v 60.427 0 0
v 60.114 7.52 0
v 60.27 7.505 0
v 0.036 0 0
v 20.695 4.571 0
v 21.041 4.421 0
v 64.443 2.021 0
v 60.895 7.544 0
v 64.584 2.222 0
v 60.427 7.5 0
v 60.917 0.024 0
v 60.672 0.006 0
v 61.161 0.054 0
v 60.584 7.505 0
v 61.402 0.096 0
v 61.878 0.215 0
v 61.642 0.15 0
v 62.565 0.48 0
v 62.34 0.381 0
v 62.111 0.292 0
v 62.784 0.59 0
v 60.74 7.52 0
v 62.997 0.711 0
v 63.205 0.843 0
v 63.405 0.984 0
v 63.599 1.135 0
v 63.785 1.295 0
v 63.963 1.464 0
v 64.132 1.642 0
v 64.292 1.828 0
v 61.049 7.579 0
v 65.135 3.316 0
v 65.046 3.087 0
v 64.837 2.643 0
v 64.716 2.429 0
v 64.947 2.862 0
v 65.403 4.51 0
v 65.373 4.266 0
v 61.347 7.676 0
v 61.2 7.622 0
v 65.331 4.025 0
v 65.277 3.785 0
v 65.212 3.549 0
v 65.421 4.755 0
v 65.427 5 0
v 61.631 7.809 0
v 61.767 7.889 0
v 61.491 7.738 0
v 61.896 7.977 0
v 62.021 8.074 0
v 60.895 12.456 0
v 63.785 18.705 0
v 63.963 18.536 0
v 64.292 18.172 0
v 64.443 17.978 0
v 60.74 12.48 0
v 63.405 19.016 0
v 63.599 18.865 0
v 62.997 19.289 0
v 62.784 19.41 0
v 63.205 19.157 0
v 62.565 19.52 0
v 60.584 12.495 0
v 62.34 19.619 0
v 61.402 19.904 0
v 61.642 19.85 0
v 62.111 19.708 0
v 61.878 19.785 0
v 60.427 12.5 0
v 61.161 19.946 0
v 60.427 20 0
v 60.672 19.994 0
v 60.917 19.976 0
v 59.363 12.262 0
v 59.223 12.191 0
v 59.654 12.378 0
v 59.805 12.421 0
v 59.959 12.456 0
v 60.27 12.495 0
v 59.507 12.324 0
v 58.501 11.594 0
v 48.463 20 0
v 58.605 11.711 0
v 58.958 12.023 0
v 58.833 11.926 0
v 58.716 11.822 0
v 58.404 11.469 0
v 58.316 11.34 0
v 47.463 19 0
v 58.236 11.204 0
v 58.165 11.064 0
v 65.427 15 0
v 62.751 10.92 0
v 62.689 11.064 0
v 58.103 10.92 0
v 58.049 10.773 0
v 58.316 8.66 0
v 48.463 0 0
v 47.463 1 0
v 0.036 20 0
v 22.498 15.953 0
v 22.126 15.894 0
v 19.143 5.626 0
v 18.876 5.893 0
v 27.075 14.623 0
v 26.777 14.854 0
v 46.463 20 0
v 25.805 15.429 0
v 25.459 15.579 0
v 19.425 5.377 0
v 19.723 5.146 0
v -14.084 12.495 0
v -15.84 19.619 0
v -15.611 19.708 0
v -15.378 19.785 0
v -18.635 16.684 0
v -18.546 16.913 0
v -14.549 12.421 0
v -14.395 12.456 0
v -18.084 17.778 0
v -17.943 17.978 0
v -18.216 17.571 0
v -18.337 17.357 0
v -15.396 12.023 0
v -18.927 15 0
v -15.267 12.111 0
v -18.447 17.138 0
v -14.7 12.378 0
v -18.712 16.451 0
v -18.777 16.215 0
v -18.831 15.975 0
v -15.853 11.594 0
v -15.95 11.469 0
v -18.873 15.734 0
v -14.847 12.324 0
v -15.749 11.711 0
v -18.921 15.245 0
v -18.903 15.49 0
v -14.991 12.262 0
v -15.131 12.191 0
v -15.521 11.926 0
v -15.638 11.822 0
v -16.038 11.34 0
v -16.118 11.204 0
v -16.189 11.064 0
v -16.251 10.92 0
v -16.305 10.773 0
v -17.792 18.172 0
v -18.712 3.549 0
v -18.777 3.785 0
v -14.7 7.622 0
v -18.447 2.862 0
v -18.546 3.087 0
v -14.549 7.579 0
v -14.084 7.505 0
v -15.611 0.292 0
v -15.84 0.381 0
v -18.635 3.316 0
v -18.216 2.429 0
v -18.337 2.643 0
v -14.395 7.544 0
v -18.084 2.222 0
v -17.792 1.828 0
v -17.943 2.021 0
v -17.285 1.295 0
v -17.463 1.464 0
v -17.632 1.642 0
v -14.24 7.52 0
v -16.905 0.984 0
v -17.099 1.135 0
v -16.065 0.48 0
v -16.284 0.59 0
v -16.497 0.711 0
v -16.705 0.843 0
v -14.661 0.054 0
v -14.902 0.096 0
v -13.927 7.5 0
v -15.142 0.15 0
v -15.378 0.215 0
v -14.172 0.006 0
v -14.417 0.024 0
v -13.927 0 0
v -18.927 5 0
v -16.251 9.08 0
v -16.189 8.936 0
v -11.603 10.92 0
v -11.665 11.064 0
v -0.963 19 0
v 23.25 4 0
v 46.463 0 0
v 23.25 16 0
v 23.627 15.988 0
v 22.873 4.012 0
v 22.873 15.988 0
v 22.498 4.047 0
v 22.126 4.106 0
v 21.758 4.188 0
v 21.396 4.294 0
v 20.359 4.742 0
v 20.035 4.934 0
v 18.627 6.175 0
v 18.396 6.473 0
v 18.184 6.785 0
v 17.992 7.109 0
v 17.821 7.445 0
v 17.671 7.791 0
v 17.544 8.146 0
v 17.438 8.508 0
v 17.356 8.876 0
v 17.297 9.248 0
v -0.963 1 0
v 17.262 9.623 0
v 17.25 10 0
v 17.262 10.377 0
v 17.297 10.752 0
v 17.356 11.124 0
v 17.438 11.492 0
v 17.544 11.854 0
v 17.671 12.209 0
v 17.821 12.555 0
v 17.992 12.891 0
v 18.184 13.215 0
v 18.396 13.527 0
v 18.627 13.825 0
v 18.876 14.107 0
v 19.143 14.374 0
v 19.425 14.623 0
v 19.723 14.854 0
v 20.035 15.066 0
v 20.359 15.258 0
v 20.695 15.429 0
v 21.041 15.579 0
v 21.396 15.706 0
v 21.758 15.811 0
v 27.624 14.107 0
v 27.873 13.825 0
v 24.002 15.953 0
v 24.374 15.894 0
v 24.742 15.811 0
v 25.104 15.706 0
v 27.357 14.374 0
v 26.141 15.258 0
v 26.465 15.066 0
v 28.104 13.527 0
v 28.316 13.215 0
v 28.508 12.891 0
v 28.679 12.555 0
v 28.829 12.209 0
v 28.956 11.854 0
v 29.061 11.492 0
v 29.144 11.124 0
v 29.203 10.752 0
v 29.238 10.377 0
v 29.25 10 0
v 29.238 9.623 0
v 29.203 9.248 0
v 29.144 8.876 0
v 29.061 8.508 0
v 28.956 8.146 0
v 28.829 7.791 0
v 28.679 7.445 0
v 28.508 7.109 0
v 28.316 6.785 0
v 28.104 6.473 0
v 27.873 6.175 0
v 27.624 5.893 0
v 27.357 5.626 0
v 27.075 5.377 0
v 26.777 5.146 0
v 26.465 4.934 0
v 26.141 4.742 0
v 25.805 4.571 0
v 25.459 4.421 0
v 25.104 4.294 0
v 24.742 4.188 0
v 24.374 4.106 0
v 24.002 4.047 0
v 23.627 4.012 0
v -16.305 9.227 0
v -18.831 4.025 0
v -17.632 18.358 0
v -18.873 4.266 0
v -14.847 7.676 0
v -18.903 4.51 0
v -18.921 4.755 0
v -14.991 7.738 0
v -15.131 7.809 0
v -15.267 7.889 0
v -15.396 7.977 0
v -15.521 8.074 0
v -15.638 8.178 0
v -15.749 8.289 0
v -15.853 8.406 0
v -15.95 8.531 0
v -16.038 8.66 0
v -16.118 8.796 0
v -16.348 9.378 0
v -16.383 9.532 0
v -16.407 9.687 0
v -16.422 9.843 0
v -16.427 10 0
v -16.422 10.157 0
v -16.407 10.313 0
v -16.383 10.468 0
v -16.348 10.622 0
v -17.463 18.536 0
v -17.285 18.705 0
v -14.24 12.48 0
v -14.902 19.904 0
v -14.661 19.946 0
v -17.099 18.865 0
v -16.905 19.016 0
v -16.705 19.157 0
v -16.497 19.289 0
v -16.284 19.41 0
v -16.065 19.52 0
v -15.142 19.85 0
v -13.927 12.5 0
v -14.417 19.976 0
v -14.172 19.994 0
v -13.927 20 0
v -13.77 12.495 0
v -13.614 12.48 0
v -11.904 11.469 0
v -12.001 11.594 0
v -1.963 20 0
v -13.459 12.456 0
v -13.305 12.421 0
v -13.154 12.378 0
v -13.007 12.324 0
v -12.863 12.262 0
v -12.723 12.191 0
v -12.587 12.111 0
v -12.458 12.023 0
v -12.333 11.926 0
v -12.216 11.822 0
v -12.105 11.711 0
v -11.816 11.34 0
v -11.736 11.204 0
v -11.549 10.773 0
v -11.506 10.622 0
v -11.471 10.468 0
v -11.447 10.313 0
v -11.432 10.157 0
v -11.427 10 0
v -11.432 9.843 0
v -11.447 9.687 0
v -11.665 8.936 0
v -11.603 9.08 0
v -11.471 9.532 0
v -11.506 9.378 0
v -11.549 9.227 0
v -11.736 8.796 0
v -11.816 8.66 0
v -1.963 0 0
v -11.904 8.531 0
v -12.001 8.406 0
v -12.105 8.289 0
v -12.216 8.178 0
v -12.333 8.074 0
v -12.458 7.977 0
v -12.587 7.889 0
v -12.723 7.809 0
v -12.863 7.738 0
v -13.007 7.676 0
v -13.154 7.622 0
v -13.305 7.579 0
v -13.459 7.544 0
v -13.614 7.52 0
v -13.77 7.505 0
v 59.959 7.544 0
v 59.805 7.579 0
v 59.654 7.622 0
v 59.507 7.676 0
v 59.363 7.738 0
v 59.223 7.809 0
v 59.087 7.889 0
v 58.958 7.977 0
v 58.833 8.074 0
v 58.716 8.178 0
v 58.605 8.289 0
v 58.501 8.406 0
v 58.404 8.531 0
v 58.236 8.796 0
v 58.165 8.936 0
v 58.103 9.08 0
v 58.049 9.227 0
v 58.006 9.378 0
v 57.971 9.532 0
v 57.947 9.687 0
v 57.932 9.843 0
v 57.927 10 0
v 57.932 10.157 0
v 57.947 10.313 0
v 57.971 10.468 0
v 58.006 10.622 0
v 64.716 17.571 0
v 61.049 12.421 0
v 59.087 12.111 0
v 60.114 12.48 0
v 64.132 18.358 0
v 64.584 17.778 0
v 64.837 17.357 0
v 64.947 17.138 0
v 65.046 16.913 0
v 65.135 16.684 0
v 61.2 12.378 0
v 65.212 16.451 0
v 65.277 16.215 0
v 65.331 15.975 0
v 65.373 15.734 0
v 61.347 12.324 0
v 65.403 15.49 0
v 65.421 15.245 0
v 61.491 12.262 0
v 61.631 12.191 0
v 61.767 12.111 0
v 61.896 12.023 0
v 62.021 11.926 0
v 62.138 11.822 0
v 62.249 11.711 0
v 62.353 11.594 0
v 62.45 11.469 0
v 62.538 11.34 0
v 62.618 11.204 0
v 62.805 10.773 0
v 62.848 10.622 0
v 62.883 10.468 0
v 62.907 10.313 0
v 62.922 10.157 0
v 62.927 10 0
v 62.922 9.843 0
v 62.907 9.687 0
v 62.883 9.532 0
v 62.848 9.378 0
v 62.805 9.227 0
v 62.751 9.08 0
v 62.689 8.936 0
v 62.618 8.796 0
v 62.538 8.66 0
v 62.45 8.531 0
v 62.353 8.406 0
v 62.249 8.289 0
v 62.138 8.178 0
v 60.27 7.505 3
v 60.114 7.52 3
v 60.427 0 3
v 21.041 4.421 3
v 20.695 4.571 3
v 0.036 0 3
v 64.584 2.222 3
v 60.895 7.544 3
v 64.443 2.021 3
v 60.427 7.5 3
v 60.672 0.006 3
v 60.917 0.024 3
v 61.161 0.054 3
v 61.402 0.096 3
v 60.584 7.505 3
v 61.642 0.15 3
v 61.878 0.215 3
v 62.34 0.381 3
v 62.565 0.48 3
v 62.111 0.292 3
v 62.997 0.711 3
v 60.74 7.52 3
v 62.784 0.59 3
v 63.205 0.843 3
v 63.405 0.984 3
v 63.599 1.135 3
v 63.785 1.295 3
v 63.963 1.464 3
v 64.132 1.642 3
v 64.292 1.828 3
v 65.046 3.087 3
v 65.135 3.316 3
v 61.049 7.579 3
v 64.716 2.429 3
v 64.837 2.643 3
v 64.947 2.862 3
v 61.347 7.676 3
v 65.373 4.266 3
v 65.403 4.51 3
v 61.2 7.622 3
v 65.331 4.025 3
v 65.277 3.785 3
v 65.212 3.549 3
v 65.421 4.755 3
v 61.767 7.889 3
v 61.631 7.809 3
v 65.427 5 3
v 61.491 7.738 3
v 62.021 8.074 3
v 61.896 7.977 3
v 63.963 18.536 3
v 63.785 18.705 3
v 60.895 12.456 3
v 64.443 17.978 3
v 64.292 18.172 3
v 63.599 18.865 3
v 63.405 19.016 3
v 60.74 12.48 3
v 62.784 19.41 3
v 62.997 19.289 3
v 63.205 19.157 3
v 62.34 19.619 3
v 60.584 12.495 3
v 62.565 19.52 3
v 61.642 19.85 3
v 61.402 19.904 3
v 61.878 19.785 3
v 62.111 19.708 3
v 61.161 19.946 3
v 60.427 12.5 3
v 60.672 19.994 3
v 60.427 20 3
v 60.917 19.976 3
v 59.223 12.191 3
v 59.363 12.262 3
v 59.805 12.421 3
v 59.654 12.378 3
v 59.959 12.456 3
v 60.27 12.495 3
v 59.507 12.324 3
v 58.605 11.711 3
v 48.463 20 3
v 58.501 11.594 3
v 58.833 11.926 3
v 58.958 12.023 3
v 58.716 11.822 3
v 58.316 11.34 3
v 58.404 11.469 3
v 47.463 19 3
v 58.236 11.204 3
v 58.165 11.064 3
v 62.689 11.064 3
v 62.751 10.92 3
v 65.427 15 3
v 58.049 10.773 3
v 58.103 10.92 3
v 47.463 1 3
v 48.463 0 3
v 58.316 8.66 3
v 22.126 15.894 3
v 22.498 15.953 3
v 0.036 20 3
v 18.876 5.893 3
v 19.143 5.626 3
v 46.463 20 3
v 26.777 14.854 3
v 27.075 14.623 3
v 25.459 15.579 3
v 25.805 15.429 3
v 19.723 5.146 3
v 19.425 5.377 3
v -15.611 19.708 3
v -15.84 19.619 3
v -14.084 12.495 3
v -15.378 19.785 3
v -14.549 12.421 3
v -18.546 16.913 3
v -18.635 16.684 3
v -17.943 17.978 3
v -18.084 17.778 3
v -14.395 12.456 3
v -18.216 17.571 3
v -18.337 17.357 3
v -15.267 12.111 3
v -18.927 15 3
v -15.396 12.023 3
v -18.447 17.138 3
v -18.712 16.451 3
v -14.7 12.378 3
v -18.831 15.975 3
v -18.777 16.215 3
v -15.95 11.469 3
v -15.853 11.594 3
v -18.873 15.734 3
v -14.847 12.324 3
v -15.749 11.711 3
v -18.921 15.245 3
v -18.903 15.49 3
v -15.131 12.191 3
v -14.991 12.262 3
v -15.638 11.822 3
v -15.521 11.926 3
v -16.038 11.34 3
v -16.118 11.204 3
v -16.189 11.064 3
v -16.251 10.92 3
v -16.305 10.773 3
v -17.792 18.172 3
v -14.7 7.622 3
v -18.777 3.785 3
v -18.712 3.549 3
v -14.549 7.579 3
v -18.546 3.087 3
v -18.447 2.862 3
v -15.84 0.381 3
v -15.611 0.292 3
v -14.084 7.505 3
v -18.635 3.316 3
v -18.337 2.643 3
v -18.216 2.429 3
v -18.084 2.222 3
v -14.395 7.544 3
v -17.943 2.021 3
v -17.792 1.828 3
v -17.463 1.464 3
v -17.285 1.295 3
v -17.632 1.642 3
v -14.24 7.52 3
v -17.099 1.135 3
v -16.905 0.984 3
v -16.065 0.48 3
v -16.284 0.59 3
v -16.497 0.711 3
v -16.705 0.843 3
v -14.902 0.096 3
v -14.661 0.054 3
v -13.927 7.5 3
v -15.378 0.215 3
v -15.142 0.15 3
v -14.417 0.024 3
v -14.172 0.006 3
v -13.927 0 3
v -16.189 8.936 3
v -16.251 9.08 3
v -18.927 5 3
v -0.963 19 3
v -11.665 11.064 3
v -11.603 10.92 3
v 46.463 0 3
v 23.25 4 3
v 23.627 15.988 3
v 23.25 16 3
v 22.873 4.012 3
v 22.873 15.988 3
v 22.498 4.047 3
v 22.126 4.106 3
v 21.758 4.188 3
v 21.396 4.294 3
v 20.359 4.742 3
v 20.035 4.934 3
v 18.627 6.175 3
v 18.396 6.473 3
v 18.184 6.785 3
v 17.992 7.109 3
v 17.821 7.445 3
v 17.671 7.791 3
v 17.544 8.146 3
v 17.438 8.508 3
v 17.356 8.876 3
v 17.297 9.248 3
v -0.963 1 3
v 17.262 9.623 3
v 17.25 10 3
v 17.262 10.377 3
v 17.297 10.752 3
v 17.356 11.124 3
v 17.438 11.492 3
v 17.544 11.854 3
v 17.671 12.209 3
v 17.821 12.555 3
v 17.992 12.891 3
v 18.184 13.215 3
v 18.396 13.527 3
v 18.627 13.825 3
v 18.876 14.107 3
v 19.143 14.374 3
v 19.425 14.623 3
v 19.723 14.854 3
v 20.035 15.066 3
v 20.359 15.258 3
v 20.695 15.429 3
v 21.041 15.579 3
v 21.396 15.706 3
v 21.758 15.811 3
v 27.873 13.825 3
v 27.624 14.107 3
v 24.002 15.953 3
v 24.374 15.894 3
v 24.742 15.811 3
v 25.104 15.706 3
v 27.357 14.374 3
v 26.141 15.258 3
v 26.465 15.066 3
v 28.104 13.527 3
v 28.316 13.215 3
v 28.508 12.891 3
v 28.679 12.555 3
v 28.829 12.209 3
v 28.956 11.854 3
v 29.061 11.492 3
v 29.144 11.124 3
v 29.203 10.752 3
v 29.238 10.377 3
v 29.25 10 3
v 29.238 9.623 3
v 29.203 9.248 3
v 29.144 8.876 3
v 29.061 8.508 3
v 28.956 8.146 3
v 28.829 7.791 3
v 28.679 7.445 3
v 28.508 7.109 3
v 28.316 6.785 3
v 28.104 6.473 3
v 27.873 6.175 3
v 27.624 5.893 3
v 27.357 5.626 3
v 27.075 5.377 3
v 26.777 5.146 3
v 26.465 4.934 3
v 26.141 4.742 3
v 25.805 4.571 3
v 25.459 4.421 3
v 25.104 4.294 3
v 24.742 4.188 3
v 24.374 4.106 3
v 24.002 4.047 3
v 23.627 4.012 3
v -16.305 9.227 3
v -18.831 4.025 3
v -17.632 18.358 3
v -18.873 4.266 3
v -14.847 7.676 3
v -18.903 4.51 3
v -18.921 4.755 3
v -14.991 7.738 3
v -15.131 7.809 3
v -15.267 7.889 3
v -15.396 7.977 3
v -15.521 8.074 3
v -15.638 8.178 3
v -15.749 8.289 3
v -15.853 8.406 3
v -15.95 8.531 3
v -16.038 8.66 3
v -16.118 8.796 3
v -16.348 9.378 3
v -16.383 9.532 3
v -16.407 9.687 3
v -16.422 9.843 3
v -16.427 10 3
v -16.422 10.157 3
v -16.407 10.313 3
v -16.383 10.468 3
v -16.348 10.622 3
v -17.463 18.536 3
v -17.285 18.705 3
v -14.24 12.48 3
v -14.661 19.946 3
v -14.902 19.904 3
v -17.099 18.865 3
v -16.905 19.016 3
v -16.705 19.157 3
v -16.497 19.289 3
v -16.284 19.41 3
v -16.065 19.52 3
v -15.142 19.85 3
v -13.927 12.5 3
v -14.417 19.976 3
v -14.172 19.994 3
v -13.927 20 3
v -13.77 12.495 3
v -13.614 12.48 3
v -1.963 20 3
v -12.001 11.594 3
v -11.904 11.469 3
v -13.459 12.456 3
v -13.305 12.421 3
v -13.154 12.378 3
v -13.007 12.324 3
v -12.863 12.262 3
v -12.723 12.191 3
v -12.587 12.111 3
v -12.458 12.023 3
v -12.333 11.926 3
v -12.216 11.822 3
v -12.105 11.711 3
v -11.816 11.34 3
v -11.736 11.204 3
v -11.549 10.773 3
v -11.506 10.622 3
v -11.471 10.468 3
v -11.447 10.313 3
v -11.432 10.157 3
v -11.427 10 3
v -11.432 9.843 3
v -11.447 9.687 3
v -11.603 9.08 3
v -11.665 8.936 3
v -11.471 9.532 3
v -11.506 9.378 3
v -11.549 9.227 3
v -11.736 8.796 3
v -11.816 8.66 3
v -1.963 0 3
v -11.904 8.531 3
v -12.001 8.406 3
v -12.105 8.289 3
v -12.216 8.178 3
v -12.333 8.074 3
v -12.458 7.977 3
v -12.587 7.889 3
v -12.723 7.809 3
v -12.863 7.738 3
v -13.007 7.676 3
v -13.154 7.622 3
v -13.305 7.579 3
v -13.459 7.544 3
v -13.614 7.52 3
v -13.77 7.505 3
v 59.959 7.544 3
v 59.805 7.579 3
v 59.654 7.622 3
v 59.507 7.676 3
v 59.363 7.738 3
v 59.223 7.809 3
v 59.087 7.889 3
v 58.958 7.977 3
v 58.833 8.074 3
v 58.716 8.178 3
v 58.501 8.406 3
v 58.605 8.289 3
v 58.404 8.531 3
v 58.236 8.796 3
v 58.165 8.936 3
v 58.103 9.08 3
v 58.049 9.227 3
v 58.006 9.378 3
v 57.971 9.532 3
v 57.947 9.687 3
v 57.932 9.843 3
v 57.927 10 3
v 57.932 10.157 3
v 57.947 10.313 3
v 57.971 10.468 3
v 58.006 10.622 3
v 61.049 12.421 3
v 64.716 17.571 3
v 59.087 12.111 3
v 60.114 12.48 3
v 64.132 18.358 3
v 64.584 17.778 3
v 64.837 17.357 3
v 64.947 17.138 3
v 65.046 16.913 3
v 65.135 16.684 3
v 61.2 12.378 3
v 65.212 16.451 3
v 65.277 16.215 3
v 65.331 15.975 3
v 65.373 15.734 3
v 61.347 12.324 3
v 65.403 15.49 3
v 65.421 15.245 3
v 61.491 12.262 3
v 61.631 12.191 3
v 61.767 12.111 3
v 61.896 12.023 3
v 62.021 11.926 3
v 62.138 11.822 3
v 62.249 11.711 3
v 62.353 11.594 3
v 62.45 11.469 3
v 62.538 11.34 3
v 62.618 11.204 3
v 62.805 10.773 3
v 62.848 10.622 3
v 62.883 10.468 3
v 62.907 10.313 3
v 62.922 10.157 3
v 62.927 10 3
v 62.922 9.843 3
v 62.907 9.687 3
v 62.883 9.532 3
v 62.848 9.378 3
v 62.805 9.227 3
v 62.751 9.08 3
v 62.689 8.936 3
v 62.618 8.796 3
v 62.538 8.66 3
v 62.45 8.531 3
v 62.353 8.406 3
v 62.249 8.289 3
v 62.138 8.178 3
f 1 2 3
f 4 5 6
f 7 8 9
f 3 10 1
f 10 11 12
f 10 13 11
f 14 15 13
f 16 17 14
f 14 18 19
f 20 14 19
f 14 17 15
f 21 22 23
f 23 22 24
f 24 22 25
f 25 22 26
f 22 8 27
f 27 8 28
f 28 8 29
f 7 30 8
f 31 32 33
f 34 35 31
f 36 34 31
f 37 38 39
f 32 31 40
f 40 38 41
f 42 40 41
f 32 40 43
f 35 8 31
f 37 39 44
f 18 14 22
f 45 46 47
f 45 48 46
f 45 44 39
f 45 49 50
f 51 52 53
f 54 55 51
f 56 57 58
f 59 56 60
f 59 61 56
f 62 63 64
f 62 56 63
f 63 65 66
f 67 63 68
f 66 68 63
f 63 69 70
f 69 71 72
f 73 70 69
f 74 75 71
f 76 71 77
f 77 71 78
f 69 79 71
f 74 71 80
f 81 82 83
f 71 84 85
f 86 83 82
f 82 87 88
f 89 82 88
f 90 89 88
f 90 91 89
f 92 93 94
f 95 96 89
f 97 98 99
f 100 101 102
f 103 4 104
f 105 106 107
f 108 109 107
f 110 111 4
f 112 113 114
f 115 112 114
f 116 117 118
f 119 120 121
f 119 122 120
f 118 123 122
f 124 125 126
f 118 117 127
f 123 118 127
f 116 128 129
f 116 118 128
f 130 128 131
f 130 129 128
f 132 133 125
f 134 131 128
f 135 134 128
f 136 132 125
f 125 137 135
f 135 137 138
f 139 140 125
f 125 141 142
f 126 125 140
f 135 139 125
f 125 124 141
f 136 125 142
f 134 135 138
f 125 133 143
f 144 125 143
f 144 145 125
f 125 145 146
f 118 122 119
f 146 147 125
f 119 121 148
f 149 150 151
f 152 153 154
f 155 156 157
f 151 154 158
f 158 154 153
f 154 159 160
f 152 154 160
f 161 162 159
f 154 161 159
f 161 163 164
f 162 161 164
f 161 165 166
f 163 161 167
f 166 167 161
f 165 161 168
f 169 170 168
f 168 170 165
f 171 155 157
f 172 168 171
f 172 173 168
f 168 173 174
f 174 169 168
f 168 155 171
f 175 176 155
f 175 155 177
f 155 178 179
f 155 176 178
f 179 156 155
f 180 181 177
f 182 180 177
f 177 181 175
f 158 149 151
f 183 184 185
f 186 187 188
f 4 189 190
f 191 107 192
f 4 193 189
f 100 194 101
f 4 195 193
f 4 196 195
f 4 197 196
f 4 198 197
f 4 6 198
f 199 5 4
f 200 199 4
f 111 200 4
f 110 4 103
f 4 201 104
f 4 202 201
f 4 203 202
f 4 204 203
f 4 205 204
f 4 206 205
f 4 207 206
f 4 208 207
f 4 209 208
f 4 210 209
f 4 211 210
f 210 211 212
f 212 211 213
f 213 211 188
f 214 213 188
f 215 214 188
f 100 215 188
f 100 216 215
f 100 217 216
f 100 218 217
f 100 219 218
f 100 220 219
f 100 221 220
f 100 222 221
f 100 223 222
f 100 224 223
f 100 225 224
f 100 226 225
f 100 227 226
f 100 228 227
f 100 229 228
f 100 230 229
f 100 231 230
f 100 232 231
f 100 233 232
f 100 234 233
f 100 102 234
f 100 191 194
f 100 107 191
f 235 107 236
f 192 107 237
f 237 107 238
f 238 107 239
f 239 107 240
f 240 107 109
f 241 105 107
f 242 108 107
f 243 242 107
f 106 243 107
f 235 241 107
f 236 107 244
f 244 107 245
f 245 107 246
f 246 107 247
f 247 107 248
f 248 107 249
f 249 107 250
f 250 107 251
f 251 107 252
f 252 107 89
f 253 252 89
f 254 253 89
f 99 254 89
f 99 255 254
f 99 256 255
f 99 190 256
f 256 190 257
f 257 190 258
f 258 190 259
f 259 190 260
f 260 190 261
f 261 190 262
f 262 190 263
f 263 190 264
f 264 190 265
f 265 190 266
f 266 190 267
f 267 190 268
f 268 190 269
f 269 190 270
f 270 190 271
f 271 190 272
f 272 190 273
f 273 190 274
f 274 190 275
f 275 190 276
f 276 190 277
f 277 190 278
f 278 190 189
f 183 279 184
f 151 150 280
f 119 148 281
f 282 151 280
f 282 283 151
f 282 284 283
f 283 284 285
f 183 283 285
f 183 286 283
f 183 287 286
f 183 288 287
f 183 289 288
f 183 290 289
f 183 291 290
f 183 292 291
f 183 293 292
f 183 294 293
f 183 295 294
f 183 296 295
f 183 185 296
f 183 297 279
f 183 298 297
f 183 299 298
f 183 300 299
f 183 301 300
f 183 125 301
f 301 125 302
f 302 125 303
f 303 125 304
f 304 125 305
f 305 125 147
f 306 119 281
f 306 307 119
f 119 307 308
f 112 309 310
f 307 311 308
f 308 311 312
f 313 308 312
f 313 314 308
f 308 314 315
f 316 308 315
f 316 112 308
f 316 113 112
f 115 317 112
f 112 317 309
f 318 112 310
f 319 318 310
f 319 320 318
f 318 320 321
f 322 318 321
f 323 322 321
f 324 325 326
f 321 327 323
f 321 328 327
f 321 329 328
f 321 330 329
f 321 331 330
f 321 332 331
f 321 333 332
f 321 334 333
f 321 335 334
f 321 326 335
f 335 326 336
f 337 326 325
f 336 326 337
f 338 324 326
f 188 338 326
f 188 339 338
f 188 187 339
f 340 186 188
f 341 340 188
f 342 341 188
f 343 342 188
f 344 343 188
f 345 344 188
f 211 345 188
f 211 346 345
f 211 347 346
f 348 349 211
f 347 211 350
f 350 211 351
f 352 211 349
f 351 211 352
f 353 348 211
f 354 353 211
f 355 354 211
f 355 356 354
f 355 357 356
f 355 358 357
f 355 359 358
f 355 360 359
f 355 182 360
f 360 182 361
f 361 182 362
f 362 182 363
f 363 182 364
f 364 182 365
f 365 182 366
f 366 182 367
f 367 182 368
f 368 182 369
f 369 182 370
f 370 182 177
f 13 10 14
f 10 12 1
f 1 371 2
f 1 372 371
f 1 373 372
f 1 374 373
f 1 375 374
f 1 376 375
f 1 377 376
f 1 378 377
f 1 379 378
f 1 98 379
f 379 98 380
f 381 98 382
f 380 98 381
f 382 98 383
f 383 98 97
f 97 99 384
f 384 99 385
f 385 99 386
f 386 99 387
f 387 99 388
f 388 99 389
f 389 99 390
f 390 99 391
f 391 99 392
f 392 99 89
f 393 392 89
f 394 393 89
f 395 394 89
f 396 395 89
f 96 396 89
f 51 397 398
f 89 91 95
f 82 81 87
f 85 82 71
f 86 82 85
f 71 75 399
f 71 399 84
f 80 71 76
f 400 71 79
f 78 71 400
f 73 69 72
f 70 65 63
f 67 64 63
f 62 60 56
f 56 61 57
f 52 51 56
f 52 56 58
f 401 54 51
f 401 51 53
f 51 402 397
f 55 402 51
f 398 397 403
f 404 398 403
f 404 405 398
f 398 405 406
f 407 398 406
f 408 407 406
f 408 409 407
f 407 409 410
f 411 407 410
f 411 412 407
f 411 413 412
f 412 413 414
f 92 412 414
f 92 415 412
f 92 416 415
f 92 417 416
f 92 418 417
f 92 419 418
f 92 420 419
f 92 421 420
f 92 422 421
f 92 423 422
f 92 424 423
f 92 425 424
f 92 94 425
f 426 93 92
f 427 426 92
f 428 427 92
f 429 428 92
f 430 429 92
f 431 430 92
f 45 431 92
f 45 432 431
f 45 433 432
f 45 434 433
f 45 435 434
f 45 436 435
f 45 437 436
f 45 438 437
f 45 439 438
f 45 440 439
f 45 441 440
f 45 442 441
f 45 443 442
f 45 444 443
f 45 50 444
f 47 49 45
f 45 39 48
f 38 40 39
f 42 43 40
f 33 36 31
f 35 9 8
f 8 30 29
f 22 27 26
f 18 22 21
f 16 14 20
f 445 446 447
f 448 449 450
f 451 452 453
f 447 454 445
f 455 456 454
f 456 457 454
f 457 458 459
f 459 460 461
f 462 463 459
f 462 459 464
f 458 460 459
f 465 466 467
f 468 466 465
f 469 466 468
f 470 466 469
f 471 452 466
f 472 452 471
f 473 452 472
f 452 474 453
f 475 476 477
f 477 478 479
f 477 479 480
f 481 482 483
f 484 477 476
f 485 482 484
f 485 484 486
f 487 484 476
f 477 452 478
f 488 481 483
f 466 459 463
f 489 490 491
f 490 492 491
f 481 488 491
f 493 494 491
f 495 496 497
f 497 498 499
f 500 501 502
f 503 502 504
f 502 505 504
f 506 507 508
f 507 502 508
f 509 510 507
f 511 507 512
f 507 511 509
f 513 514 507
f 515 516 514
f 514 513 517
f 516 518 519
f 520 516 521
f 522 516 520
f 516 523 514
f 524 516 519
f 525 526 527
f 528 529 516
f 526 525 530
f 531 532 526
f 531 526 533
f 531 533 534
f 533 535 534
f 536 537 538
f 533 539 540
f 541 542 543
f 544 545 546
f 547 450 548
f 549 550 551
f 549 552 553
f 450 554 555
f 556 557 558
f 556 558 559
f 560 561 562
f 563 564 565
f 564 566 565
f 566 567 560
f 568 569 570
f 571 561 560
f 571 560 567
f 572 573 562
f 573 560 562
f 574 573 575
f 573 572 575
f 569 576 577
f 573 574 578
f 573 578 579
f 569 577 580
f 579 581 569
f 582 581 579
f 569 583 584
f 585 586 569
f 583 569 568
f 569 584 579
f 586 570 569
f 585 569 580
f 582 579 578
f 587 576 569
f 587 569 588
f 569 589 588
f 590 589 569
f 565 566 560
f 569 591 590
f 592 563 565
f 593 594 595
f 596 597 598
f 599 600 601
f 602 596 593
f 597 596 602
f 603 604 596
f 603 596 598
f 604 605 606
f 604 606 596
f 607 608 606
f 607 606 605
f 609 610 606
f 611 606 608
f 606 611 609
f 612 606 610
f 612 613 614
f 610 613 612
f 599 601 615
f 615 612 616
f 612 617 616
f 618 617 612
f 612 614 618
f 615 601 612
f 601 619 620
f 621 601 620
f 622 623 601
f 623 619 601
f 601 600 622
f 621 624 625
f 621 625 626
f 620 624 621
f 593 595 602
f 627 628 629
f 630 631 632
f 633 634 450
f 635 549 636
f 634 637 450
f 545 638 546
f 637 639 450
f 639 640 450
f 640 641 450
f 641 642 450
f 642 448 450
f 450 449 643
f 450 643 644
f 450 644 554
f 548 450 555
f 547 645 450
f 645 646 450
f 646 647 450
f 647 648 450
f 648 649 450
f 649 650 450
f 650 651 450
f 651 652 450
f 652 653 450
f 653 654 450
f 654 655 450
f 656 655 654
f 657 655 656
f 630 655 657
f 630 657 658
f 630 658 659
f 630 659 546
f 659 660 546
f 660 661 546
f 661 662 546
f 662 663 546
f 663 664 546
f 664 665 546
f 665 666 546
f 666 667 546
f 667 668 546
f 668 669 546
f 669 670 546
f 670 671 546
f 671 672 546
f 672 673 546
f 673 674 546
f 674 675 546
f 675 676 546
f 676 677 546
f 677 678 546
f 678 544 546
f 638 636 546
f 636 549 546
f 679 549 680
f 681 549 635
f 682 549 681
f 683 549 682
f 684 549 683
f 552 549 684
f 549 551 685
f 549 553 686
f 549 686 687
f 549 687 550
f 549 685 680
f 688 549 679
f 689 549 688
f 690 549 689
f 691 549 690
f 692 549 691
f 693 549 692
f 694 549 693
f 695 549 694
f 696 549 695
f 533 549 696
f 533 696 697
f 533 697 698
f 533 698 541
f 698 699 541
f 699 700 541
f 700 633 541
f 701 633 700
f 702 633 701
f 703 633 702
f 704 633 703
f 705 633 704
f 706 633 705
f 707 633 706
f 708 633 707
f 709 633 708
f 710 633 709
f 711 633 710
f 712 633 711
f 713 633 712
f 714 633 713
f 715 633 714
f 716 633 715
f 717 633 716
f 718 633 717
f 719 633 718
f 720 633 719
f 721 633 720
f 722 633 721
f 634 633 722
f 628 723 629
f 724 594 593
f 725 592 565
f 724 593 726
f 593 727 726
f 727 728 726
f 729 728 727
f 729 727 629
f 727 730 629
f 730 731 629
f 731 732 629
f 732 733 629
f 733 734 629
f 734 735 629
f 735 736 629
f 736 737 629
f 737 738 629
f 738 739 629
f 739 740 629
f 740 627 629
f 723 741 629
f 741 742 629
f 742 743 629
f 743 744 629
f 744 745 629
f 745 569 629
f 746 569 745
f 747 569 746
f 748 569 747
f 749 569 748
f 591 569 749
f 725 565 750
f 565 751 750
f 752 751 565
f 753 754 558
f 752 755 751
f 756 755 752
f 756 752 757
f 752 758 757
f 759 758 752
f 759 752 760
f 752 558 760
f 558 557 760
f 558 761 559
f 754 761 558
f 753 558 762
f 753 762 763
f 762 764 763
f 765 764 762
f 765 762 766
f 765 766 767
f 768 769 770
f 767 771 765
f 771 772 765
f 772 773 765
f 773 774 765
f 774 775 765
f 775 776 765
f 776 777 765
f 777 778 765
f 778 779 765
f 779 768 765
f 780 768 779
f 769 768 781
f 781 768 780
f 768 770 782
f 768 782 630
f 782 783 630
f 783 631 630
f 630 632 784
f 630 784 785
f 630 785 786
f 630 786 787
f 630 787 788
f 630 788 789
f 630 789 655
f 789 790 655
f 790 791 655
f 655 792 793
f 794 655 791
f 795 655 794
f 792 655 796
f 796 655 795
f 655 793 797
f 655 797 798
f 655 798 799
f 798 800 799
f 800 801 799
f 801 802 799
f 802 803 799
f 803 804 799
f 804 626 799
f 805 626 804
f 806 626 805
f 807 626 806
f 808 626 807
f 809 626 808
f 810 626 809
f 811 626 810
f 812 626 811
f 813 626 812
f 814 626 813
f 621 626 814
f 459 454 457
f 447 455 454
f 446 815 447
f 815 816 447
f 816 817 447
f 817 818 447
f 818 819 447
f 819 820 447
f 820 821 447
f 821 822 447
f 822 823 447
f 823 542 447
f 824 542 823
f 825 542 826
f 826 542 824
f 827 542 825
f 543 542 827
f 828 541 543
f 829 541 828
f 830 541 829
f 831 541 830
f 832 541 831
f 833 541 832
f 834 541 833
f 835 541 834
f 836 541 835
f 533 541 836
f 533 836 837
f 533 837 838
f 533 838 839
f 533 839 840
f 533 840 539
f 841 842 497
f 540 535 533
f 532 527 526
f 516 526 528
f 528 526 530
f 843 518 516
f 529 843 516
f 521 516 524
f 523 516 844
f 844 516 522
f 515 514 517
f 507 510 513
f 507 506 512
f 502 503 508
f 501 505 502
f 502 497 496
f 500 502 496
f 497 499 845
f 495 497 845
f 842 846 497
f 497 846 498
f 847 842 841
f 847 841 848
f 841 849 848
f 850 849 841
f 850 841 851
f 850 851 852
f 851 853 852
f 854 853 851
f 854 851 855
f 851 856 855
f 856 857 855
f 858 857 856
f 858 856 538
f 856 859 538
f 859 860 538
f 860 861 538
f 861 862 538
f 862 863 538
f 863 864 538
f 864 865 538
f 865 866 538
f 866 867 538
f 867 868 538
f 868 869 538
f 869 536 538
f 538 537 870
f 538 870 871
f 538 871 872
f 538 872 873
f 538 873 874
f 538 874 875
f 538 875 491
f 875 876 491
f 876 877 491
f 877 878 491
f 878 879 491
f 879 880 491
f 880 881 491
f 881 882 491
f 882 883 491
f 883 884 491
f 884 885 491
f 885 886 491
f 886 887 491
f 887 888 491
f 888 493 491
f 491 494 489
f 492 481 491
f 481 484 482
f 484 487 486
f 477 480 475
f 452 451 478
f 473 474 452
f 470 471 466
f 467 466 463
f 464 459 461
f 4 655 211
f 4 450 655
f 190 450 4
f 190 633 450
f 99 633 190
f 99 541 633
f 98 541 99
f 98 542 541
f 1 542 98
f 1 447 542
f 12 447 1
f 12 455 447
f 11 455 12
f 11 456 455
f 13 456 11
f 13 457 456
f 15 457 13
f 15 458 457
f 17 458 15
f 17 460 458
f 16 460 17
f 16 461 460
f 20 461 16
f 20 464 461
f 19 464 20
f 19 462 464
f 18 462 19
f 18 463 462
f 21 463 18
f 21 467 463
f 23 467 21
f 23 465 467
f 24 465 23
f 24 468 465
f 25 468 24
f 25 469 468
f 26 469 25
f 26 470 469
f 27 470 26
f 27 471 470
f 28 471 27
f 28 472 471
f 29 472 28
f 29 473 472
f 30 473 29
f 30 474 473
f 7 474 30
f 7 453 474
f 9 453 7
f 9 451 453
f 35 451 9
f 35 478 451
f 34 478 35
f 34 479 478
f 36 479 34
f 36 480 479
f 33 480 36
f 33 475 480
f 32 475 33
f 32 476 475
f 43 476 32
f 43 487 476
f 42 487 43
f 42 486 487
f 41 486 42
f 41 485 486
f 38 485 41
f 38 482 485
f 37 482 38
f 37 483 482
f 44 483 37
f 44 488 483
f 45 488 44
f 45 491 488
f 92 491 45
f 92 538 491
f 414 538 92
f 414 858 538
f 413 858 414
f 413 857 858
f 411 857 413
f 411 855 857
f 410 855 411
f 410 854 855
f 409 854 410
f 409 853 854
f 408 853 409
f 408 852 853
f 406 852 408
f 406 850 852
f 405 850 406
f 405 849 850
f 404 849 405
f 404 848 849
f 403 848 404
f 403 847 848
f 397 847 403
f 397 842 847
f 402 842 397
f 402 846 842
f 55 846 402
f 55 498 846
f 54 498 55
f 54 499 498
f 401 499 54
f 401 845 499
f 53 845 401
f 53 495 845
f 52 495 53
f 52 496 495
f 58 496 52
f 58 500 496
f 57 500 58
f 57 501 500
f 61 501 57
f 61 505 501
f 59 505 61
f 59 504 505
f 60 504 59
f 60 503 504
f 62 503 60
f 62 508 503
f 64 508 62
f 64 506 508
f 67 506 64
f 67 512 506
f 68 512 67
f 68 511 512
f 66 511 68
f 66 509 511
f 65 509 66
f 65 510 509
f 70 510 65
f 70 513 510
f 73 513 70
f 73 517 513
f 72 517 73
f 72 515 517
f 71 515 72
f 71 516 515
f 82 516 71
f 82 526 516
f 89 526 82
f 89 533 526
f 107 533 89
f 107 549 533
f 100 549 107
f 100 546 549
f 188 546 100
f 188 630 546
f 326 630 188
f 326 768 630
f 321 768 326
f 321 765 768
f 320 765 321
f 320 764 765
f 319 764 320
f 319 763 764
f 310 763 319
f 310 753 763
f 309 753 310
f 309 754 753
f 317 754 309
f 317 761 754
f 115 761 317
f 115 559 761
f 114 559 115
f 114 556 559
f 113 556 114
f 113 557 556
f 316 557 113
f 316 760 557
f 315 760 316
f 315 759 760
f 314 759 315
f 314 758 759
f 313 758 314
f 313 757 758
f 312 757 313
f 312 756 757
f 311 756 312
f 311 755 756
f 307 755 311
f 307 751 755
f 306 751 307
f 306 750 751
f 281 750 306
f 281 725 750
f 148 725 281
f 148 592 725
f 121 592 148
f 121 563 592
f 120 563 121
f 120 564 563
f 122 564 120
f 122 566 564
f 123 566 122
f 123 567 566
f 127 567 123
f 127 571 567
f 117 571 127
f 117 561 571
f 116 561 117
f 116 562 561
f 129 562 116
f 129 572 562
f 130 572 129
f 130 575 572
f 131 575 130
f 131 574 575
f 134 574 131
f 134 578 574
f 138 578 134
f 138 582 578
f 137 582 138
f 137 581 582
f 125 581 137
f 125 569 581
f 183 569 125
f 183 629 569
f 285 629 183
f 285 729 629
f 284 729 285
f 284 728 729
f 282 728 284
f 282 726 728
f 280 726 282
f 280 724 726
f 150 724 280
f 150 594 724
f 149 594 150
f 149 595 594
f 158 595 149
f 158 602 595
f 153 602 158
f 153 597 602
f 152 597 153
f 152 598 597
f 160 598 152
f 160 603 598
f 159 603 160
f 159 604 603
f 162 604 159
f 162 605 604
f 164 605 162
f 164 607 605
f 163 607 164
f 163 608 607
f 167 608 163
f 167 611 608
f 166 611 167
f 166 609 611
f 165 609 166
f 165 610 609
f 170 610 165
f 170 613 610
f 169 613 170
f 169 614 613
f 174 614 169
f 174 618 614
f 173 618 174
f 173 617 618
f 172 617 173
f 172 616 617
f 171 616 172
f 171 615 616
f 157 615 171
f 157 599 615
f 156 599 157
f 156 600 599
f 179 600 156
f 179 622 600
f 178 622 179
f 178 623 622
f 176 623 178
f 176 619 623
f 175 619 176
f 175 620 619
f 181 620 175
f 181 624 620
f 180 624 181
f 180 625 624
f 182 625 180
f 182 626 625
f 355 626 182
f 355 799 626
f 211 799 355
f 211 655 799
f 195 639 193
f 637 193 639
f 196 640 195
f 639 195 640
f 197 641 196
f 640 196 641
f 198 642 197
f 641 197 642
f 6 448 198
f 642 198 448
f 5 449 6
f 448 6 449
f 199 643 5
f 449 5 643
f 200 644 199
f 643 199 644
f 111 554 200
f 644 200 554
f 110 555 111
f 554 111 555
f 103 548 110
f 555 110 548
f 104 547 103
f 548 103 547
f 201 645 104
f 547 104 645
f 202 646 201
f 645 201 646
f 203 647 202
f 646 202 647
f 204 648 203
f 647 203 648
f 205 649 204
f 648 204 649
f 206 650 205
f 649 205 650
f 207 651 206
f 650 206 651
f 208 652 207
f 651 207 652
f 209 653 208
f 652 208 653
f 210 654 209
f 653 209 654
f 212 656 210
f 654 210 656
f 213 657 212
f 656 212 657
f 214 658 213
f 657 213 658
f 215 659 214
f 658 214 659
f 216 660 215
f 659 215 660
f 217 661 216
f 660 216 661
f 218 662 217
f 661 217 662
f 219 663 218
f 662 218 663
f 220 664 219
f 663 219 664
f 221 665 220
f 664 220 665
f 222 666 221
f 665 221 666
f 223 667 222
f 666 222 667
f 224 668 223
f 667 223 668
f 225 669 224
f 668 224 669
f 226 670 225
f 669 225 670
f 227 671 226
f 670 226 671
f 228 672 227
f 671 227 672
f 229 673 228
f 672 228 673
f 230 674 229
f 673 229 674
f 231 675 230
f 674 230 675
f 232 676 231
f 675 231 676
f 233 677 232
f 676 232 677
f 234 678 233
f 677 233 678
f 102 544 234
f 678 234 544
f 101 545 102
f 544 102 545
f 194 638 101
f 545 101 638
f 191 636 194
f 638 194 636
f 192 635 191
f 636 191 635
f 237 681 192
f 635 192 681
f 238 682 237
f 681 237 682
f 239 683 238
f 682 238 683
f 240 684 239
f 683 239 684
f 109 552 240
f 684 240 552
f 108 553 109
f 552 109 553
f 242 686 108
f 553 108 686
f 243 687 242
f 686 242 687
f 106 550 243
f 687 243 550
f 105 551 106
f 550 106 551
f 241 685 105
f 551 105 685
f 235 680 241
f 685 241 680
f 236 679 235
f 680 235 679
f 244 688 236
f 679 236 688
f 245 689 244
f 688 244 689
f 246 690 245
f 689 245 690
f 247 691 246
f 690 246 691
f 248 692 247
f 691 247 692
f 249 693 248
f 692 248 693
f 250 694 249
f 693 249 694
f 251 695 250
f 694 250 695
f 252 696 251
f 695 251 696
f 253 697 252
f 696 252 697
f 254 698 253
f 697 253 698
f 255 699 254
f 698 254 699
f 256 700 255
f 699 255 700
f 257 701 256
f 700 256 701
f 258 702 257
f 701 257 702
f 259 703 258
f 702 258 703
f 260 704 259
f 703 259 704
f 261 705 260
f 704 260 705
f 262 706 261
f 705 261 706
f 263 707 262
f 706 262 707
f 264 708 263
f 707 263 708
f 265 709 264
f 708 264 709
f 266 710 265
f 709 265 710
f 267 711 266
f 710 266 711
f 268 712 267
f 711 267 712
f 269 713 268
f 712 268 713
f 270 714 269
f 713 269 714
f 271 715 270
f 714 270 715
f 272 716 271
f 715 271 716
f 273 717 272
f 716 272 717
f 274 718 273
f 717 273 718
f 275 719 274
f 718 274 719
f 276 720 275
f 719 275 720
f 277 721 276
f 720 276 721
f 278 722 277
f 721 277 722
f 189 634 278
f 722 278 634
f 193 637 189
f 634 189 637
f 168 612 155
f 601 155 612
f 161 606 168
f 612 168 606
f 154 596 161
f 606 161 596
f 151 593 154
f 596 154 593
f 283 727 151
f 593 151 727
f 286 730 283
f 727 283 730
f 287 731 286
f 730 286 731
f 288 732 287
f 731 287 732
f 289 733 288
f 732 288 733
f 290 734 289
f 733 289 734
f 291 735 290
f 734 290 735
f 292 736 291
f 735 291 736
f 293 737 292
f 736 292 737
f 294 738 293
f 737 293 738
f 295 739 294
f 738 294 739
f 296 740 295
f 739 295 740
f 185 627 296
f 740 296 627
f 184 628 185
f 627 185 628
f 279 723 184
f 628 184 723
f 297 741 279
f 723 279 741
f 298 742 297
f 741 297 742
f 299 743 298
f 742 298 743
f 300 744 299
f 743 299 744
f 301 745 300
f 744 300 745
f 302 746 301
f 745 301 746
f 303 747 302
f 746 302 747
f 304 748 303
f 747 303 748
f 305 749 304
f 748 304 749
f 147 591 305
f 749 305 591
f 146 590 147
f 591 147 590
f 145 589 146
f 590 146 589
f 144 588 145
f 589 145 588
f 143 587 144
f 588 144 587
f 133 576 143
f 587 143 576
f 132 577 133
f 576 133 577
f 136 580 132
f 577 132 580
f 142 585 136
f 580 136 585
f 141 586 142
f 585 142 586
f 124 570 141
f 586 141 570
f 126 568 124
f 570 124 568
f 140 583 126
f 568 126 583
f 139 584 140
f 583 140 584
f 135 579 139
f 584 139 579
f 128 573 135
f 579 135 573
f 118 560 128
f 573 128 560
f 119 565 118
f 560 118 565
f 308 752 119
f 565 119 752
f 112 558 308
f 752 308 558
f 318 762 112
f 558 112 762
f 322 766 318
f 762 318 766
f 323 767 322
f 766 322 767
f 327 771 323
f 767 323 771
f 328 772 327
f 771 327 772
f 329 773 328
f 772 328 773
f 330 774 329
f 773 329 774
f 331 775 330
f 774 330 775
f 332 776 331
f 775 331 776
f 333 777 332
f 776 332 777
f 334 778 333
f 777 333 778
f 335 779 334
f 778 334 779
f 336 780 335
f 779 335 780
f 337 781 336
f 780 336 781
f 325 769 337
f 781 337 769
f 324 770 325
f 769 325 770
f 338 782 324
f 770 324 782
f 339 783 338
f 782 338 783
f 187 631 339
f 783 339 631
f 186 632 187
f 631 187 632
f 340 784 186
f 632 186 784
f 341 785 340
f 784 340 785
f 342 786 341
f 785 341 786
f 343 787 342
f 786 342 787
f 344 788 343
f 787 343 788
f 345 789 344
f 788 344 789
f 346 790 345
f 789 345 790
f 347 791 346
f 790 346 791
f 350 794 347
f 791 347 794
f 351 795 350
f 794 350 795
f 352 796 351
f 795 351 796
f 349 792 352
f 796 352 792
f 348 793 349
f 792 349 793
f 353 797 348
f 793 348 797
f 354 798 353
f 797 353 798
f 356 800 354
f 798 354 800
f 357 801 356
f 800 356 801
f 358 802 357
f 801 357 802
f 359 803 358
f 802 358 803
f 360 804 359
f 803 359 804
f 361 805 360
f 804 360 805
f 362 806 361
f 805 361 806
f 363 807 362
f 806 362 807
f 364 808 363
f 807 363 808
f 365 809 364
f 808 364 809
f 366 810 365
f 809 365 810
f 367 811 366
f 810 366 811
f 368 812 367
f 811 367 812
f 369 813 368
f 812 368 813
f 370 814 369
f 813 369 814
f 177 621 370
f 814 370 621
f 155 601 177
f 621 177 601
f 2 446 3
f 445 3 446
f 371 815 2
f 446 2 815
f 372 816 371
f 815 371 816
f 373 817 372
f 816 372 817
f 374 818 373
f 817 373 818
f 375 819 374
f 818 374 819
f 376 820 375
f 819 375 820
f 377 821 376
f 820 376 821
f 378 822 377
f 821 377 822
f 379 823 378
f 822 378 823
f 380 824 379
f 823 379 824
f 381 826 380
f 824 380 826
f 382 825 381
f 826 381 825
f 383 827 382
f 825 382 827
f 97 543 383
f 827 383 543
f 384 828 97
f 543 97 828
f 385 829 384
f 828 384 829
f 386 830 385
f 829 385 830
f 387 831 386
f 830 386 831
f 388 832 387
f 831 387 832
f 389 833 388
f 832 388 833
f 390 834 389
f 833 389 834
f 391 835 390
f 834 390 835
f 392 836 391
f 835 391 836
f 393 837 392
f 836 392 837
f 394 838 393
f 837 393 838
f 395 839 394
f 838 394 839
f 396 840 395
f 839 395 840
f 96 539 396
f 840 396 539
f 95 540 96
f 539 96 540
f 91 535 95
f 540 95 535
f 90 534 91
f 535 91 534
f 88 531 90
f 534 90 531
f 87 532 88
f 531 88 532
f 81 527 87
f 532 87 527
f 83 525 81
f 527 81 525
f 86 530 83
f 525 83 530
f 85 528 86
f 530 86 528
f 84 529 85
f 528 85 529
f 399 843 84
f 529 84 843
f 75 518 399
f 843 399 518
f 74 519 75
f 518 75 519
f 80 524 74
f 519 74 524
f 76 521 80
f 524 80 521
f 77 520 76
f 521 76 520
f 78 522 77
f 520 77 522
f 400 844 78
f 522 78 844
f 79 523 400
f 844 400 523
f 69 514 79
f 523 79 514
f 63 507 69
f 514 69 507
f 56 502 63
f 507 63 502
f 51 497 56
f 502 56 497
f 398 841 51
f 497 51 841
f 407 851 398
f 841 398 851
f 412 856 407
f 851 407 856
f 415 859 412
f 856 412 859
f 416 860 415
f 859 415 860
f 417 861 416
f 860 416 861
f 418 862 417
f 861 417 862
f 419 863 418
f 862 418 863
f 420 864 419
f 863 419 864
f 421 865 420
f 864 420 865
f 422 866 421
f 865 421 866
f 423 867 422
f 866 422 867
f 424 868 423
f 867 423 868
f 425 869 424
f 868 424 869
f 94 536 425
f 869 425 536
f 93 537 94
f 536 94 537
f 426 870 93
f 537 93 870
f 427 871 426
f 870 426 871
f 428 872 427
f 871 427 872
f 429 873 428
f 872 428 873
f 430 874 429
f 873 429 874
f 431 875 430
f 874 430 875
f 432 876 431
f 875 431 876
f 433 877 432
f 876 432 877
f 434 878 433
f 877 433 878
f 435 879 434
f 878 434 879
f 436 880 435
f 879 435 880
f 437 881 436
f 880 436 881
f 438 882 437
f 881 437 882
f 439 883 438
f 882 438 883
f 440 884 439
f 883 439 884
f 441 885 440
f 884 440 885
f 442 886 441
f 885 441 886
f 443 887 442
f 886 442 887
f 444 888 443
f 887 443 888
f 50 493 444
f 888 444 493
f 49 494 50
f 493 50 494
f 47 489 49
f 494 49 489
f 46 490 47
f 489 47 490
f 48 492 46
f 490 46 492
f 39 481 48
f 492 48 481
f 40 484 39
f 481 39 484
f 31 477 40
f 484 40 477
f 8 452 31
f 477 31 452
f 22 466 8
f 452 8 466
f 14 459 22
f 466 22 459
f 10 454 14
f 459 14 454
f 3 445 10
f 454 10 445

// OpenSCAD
// 3mm Brake Spring Back Plate
// Extracted and reconstructed from DXF

$fn = 100;

// Main module to generate the part
module brake_spring_back_plate(thickness = 3.0) {
    linear_extrude(height = thickness) {
        difference() {
            outer_profile();
            internal_holes();
        }
    }
}

// Reconstruct the 2D outer perimeter with all lines, V-notches, and arcs
module outer_profile() {
    // Arc center points and radii derived from DXF
    cx1 = -13.926990817; // Left arcs X center
    cx2 = 60.426990817;  // Right arcs X center
    cy_bot = 5.0;        // Bottom arcs Y center
    cy_top = 15.0;       // Top arcs Y center
    rad = 5.0;           // Corner arcs radius
    
    // Resolution for individual 90-degree corner arcs
    n_arc = 32; 
    
    // Construct the continuous perimeter point list by concatenating segments counter-clockwise
    points = concat(
        // Left-top arc (90 to 180 degrees)
        [ for (i = [0 : n_arc]) 
            [cx1 + rad * cos(90 + i * 90 / n_arc), cy_top + rad * sin(90 + i * 90 / n_arc)] ],
        
        // Left-bottom arc (180 to 270 degrees)
        [ for (i = [0 : n_arc]) 
            [cx1 + rad * cos(180 + i * 90 / n_arc), cy_bot + rad * sin(180 + i * 90 / n_arc)] ],
        
        // Bottom straight edge with structural fold V-notches
        [
            [-1.9634954085, 0.0],
            [-0.9634954085, 1.0],
            [0.0365045915, 0.0],
            
            [46.4634954085, 0.0],
            [47.4634954085, 1.0],
            [48.4634954085, 0.0]
        ],
        
        // Right-bottom arc (270 to 360 degrees)
        [ for (i = [0 : n_arc]) 
            [cx2 + rad * cos(270 + i * 90 / n_arc), cy_bot + rad * sin(270 + i * 90 / n_arc)] ],
        
        // Right-top arc (0 to 90 degrees)
        [ for (i = [0 : n_arc]) 
            [cx2 + rad * cos(0 + i * 90 / n_arc), cy_top + rad * sin(0 + i * 90 / n_arc)] ],
        
        // Top straight edge with structural fold V-notches
        [
            [48.4634954085, 20.0],
            [47.4634954085, 19.0],
            [46.4634954085, 20.0],
            
            [0.0365045915, 20.0],
            [-0.9634954085, 19.0],
            [-1.9634954085, 20.0]
        ]
    );
    
    // Draw the main enclosed shape
    polygon(points);
}

// Precise circle locations from CUT layer
module internal_holes() {
    // Left side hole (aligned with arcs centers)
    translate([-13.926990817, 10.0]) circle(r = 2.5);
    
    // Right side hole (aligned with arcs centers)
    translate([60.426990817, 10.0]) circle(r = 2.5);
    
    // Main central hole
    translate([23.25, 10.0]) circle(r = 6.0);
}

// Generate part
brake_spring_back_plate();
